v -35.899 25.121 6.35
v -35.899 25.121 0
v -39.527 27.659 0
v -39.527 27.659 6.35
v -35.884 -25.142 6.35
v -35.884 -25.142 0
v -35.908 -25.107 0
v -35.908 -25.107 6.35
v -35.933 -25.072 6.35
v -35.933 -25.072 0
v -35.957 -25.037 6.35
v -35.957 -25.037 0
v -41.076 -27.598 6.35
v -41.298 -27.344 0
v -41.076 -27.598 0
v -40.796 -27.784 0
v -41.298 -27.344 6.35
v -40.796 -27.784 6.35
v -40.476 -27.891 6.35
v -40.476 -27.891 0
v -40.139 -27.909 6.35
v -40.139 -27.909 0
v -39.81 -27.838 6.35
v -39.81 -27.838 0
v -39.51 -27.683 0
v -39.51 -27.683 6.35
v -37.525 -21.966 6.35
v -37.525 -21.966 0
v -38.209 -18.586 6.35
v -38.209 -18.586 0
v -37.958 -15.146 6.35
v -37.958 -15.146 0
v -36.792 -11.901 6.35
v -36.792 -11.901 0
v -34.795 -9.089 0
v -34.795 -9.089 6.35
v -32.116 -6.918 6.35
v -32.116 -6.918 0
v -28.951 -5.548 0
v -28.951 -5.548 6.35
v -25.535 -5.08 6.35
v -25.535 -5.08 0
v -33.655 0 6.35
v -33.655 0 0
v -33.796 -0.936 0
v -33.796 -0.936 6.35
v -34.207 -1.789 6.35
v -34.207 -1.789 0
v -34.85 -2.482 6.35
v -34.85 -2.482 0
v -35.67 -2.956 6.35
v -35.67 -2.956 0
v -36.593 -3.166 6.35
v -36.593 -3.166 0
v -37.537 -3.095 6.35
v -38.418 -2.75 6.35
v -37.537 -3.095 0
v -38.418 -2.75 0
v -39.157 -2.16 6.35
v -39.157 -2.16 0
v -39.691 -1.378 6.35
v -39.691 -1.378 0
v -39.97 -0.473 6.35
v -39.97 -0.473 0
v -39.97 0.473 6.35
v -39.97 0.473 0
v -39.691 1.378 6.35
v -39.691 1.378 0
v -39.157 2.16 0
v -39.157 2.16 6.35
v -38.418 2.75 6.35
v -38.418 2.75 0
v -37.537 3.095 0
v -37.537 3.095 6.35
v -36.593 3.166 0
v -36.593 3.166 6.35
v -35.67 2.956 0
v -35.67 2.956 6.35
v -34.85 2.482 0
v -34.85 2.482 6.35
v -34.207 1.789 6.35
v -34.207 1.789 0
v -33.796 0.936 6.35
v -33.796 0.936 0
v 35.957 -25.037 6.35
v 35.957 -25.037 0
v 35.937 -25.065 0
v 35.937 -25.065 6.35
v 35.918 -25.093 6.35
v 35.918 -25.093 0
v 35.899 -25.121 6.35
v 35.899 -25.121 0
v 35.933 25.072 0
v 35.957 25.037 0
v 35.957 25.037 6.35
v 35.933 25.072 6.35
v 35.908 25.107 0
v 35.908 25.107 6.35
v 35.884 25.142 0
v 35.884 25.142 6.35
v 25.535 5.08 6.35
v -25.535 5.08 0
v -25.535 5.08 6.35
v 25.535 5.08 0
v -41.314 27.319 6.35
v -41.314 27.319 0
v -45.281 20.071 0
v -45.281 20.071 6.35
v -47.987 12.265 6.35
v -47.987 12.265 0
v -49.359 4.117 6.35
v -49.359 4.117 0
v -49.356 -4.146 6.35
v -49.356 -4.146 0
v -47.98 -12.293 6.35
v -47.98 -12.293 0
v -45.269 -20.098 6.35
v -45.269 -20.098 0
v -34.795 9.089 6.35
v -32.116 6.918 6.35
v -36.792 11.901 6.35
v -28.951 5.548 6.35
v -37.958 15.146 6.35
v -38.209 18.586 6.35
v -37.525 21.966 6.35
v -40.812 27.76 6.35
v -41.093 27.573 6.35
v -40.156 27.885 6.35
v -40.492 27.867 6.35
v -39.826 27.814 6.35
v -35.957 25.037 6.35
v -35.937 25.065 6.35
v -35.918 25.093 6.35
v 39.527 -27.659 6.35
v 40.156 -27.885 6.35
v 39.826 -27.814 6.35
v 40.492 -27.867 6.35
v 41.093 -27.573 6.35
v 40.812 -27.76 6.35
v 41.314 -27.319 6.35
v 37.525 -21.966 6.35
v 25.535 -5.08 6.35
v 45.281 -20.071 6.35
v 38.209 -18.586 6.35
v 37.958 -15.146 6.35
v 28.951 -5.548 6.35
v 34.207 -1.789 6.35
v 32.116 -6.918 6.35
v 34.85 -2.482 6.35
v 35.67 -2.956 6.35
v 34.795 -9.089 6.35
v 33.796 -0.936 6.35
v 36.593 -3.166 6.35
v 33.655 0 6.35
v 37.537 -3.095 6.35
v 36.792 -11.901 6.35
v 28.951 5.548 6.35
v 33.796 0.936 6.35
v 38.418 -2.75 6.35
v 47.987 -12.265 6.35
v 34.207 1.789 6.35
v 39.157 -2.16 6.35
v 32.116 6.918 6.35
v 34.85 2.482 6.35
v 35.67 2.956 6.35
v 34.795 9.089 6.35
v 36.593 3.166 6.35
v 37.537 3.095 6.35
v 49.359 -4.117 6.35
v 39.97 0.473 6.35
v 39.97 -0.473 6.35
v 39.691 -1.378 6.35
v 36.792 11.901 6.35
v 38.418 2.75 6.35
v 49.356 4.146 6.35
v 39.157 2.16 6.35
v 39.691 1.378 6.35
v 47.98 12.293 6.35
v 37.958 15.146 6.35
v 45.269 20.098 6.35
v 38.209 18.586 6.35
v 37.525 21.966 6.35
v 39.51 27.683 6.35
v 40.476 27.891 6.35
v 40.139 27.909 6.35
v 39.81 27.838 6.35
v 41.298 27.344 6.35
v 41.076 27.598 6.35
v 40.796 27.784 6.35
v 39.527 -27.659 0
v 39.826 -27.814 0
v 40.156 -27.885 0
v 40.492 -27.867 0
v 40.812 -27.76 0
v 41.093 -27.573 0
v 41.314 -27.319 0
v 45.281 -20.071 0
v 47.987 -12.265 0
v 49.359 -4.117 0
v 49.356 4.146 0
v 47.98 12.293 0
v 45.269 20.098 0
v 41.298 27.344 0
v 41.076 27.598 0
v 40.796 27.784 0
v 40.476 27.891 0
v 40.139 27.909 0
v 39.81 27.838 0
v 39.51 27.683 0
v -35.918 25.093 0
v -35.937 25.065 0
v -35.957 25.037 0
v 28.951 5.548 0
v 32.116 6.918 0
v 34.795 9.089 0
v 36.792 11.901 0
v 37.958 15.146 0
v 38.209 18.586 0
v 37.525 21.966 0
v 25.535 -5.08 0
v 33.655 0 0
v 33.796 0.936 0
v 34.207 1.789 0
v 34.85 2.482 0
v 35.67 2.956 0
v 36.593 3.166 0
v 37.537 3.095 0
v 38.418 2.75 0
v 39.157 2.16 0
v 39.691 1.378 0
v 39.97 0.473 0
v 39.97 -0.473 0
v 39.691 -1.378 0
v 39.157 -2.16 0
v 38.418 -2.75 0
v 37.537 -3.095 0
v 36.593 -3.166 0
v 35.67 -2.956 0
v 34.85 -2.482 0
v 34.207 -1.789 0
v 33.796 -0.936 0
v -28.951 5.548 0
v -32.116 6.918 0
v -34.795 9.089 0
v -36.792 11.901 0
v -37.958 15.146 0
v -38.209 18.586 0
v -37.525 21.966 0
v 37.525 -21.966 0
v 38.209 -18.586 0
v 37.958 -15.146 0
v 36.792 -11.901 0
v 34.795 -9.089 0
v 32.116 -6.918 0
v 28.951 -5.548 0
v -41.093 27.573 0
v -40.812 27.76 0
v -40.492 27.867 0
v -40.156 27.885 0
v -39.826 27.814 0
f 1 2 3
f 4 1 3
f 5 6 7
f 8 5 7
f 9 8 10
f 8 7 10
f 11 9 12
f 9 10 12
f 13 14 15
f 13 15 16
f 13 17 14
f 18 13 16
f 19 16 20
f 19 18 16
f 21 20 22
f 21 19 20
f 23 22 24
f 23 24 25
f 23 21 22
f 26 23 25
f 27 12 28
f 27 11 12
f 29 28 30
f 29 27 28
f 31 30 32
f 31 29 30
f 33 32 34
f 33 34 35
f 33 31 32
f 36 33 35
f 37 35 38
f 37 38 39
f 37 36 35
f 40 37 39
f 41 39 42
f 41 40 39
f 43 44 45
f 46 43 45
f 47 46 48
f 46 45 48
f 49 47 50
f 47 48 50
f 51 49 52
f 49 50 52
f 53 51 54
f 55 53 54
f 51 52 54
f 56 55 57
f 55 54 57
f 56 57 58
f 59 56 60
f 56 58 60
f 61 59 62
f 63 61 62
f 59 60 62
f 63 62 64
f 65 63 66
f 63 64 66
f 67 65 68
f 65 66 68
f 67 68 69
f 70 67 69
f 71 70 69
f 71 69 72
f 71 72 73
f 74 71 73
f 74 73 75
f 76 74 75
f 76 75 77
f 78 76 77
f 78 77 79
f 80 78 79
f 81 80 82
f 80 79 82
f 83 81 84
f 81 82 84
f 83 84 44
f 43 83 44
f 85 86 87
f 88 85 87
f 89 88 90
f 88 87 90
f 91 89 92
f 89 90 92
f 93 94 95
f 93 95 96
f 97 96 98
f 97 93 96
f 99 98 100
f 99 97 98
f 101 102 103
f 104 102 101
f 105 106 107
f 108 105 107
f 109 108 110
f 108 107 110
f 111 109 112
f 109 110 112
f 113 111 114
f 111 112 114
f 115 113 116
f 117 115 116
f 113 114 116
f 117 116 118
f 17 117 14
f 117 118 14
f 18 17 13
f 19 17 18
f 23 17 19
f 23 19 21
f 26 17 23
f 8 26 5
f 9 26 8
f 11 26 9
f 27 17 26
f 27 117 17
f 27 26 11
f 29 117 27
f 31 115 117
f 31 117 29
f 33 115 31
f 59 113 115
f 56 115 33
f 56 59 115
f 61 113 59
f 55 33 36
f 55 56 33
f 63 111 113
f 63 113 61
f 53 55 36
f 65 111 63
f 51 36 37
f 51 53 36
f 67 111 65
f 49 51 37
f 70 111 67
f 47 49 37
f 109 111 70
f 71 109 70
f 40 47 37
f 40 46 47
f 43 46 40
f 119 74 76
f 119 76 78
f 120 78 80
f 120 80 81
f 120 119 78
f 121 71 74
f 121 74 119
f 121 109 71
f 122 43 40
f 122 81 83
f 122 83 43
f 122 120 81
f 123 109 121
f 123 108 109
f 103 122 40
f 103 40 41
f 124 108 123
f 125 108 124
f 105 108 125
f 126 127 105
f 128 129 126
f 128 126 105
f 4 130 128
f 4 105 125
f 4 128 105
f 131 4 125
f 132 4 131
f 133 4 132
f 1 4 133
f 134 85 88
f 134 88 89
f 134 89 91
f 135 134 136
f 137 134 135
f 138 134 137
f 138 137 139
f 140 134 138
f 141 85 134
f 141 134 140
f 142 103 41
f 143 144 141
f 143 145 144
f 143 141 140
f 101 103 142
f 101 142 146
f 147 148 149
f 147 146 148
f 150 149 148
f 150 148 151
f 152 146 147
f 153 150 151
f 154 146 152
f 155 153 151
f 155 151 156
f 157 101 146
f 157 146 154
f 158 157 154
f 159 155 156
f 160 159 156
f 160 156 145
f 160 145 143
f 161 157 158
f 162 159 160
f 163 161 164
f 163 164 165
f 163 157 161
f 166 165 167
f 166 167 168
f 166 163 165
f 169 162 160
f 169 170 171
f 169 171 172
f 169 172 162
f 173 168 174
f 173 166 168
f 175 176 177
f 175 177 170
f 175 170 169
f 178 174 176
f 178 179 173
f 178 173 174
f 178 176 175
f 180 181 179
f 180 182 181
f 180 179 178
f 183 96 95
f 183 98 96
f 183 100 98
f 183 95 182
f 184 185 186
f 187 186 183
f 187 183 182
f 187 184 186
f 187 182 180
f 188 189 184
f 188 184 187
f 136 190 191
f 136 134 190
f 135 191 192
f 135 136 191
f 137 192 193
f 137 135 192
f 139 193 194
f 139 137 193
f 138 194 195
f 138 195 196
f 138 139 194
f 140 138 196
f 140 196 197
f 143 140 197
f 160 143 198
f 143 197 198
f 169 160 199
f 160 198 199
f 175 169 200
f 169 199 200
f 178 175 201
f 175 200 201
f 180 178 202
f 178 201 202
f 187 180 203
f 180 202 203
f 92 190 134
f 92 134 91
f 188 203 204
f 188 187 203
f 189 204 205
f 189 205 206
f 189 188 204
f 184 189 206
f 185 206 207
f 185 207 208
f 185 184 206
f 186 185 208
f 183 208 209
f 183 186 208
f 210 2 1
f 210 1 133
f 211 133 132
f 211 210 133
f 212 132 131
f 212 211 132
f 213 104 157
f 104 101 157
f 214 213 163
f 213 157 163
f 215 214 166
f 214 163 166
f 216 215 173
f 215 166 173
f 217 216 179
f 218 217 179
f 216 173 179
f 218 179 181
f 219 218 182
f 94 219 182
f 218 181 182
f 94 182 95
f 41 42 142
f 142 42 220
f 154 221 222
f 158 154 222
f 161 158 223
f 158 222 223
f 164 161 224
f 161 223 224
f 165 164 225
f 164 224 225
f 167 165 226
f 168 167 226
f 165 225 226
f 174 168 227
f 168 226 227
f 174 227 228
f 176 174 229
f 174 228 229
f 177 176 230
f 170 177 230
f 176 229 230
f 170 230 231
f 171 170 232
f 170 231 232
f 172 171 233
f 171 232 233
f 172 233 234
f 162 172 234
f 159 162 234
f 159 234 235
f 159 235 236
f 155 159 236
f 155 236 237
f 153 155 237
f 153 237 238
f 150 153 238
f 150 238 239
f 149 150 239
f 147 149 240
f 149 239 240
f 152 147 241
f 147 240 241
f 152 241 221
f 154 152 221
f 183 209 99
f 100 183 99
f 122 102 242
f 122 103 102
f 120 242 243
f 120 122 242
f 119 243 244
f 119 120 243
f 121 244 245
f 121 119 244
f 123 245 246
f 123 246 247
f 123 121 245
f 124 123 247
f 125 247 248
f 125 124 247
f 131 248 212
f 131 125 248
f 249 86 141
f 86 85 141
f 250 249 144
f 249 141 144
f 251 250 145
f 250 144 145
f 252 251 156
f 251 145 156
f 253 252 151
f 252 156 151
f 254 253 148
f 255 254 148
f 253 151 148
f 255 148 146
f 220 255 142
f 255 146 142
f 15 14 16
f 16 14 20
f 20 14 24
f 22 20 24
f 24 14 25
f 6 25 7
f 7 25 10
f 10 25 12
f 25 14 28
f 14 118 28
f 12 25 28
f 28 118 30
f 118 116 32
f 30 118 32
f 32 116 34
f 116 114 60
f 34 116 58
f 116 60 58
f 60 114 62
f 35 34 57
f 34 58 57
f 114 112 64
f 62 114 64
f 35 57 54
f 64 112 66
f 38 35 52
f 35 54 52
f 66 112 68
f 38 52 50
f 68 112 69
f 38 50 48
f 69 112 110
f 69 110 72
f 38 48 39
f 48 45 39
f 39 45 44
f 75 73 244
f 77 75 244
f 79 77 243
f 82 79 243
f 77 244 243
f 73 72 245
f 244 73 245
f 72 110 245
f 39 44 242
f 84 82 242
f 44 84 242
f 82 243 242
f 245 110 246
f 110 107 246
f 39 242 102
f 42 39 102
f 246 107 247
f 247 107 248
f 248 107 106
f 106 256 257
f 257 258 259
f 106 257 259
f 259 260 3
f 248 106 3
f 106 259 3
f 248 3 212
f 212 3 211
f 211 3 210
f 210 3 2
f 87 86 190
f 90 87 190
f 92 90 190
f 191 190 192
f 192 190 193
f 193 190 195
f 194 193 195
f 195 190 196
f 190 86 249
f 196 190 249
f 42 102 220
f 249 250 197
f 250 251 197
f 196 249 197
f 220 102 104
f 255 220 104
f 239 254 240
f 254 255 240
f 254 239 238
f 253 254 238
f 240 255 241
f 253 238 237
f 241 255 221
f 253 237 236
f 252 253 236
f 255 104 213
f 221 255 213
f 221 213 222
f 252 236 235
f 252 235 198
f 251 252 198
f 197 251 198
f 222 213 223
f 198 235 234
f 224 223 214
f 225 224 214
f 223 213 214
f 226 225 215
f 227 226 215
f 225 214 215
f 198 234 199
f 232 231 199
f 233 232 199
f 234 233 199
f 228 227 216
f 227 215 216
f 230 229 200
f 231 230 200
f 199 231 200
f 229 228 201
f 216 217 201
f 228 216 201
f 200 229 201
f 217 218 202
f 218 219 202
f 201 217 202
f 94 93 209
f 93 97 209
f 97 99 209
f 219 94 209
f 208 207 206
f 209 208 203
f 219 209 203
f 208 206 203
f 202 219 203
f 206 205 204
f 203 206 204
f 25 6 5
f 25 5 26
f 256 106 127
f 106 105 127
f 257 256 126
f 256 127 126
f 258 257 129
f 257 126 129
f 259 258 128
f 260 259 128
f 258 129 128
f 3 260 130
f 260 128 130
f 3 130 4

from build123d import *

# Parameters (mm, degrees)
SKETCH1_R           = 49.53
BOSS_EXTRUDE2_DEPTH = 6.35
FILLET2_R           = 12.7
FILLET3_R           = 12.7
FILLET4_R           = 12.7
FILLET5_R           = 12.7
CUT_EXTRUDE1_DEPTH  = 6.35
SKETCH3_R           = 3.175
CUT_EXTRUDE2_DEPTH  = 6.35
FILLET6_R           = 1.27
FILLET7_R           = 1.27
FILLET8_R           = 1.27
FILLET9_R           = 1.27


with BuildPart() as part:
    # Sketch1 → Boss-Extrude2 (new body)
    with BuildSketch(Plane.XY):
        Circle(SKETCH1_R)
        with BuildLine():
            Line((-43.519510854, 5.08), (43.519510854, 5.08))
            ThreePointArc((43.519510854, 5.08), (0, 43.815), (-43.519510854, 5.08))
        make_face(mode=Mode.SUBTRACT)
        with BuildLine():
            Line((-43.519510854, -5.08), (43.519510854, -5.08))
            ThreePointArc((43.519510854, -5.08), (0, -43.815), (-43.519510854, -5.08))
        make_face(mode=Mode.SUBTRACT)
    extrude(amount=BOSS_EXTRUDE2_DEPTH)

    # Fillet2
    fillet2_edges = [part.edges().sort_by_distance(p)[0] for p in [
        (43.519510854, 5.08, 3.175),
    ]]
    fillet(fillet2_edges, radius=FILLET2_R)

    # Fillet3
    fillet3_edges = [part.edges().sort_by_distance(p)[0] for p in [
        (-43.519510854, 5.08, 3.175),
    ]]
    fillet(fillet3_edges, radius=FILLET3_R)

    # Fillet4
    fillet4_edges = [part.edges().sort_by_distance(p)[0] for p in [
        (43.519510854, -5.08, 3.175),
    ]]
    fillet(fillet4_edges, radius=FILLET4_R)

    # Fillet5
    fillet5_edges = [part.edges().sort_by_distance(p)[0] for p in [
        (-43.519510854, -5.08, 3.175),
    ]]
    fillet(fillet5_edges, radius=FILLET5_R)

    # Sketch2 → Cut-Extrude1 (cut)
    with BuildSketch(Plane(origin=(0, 0, 0), x_dir=(-1, 0, 0), z_dir=(0, 0, -1))):
        with BuildLine():
            Line((-40.581029215, -28.3972), (-35.898602767, -25.1206))
            ThreePointArc((-35.898602767, -25.1206), (-0.013001801, -43.814998071), (35.883687713, -25.141900904))
            Line((35.883687713, -25.141900904), (40.564168719, -28.421279283))
            ThreePointArc((40.564168719, -28.421279283), (-0.014697689, -49.529997819), (-40.581029215, -28.3972))
        make_face()
        with BuildLine():
            Line((-40.564168719, 28.421279283), (-35.883687713, 25.141900904))
            ThreePointArc((-35.883687713, 25.141900904), (0.013001801, 43.814998071), (35.898602767, 25.1206))
            Line((35.898602767, 25.1206), (40.581029215, 28.3972))
            ThreePointArc((40.581029215, 28.3972), (0.014697689, 49.529997819), (-40.564168719, 28.421279283))
        make_face()
    extrude(amount=-CUT_EXTRUDE1_DEPTH, mode=Mode.SUBTRACT)

    # Sketch3 → Cut-Extrude2 (cut)
    with BuildSketch(Plane(origin=(0, 0, 0), x_dir=(-1, 0, 0), z_dir=(0, 0, -1))):
        with Locations((-36.83, 0)):
            Circle(SKETCH3_R)
        with Locations(Location((36.83, 0, 0), (0, 0, 180))):
            Circle(SKETCH3_R)
    extrude(amount=-CUT_EXTRUDE2_DEPTH, mode=Mode.SUBTRACT)

    # Fillet6
    fillet6_edges = [part.edges().sort_by_distance(p)[0] for p in [
        (-40.581029215, 28.3972, 3.175),
    ]]
    fillet(fillet6_edges, radius=FILLET6_R)

    # Fillet7
    fillet7_edges = [part.edges().sort_by_distance(p)[0] for p in [
        (-40.564168719, -28.421279283, 3.175),
    ]]
    fillet(fillet7_edges, radius=FILLET7_R)

    # Fillet8
    fillet8_edges = [part.edges().sort_by_distance(p)[0] for p in [
        (40.581029215, -28.3972, 3.175),
    ]]
    fillet(fillet8_edges, radius=FILLET8_R)

    # Fillet9
    fillet9_edges = [part.edges().sort_by_distance(p)[0] for p in [
        (40.564168719, 28.421279283, 3.175),
    ]]
    fillet(fillet9_edges, radius=FILLET9_R)


solid = part.part
